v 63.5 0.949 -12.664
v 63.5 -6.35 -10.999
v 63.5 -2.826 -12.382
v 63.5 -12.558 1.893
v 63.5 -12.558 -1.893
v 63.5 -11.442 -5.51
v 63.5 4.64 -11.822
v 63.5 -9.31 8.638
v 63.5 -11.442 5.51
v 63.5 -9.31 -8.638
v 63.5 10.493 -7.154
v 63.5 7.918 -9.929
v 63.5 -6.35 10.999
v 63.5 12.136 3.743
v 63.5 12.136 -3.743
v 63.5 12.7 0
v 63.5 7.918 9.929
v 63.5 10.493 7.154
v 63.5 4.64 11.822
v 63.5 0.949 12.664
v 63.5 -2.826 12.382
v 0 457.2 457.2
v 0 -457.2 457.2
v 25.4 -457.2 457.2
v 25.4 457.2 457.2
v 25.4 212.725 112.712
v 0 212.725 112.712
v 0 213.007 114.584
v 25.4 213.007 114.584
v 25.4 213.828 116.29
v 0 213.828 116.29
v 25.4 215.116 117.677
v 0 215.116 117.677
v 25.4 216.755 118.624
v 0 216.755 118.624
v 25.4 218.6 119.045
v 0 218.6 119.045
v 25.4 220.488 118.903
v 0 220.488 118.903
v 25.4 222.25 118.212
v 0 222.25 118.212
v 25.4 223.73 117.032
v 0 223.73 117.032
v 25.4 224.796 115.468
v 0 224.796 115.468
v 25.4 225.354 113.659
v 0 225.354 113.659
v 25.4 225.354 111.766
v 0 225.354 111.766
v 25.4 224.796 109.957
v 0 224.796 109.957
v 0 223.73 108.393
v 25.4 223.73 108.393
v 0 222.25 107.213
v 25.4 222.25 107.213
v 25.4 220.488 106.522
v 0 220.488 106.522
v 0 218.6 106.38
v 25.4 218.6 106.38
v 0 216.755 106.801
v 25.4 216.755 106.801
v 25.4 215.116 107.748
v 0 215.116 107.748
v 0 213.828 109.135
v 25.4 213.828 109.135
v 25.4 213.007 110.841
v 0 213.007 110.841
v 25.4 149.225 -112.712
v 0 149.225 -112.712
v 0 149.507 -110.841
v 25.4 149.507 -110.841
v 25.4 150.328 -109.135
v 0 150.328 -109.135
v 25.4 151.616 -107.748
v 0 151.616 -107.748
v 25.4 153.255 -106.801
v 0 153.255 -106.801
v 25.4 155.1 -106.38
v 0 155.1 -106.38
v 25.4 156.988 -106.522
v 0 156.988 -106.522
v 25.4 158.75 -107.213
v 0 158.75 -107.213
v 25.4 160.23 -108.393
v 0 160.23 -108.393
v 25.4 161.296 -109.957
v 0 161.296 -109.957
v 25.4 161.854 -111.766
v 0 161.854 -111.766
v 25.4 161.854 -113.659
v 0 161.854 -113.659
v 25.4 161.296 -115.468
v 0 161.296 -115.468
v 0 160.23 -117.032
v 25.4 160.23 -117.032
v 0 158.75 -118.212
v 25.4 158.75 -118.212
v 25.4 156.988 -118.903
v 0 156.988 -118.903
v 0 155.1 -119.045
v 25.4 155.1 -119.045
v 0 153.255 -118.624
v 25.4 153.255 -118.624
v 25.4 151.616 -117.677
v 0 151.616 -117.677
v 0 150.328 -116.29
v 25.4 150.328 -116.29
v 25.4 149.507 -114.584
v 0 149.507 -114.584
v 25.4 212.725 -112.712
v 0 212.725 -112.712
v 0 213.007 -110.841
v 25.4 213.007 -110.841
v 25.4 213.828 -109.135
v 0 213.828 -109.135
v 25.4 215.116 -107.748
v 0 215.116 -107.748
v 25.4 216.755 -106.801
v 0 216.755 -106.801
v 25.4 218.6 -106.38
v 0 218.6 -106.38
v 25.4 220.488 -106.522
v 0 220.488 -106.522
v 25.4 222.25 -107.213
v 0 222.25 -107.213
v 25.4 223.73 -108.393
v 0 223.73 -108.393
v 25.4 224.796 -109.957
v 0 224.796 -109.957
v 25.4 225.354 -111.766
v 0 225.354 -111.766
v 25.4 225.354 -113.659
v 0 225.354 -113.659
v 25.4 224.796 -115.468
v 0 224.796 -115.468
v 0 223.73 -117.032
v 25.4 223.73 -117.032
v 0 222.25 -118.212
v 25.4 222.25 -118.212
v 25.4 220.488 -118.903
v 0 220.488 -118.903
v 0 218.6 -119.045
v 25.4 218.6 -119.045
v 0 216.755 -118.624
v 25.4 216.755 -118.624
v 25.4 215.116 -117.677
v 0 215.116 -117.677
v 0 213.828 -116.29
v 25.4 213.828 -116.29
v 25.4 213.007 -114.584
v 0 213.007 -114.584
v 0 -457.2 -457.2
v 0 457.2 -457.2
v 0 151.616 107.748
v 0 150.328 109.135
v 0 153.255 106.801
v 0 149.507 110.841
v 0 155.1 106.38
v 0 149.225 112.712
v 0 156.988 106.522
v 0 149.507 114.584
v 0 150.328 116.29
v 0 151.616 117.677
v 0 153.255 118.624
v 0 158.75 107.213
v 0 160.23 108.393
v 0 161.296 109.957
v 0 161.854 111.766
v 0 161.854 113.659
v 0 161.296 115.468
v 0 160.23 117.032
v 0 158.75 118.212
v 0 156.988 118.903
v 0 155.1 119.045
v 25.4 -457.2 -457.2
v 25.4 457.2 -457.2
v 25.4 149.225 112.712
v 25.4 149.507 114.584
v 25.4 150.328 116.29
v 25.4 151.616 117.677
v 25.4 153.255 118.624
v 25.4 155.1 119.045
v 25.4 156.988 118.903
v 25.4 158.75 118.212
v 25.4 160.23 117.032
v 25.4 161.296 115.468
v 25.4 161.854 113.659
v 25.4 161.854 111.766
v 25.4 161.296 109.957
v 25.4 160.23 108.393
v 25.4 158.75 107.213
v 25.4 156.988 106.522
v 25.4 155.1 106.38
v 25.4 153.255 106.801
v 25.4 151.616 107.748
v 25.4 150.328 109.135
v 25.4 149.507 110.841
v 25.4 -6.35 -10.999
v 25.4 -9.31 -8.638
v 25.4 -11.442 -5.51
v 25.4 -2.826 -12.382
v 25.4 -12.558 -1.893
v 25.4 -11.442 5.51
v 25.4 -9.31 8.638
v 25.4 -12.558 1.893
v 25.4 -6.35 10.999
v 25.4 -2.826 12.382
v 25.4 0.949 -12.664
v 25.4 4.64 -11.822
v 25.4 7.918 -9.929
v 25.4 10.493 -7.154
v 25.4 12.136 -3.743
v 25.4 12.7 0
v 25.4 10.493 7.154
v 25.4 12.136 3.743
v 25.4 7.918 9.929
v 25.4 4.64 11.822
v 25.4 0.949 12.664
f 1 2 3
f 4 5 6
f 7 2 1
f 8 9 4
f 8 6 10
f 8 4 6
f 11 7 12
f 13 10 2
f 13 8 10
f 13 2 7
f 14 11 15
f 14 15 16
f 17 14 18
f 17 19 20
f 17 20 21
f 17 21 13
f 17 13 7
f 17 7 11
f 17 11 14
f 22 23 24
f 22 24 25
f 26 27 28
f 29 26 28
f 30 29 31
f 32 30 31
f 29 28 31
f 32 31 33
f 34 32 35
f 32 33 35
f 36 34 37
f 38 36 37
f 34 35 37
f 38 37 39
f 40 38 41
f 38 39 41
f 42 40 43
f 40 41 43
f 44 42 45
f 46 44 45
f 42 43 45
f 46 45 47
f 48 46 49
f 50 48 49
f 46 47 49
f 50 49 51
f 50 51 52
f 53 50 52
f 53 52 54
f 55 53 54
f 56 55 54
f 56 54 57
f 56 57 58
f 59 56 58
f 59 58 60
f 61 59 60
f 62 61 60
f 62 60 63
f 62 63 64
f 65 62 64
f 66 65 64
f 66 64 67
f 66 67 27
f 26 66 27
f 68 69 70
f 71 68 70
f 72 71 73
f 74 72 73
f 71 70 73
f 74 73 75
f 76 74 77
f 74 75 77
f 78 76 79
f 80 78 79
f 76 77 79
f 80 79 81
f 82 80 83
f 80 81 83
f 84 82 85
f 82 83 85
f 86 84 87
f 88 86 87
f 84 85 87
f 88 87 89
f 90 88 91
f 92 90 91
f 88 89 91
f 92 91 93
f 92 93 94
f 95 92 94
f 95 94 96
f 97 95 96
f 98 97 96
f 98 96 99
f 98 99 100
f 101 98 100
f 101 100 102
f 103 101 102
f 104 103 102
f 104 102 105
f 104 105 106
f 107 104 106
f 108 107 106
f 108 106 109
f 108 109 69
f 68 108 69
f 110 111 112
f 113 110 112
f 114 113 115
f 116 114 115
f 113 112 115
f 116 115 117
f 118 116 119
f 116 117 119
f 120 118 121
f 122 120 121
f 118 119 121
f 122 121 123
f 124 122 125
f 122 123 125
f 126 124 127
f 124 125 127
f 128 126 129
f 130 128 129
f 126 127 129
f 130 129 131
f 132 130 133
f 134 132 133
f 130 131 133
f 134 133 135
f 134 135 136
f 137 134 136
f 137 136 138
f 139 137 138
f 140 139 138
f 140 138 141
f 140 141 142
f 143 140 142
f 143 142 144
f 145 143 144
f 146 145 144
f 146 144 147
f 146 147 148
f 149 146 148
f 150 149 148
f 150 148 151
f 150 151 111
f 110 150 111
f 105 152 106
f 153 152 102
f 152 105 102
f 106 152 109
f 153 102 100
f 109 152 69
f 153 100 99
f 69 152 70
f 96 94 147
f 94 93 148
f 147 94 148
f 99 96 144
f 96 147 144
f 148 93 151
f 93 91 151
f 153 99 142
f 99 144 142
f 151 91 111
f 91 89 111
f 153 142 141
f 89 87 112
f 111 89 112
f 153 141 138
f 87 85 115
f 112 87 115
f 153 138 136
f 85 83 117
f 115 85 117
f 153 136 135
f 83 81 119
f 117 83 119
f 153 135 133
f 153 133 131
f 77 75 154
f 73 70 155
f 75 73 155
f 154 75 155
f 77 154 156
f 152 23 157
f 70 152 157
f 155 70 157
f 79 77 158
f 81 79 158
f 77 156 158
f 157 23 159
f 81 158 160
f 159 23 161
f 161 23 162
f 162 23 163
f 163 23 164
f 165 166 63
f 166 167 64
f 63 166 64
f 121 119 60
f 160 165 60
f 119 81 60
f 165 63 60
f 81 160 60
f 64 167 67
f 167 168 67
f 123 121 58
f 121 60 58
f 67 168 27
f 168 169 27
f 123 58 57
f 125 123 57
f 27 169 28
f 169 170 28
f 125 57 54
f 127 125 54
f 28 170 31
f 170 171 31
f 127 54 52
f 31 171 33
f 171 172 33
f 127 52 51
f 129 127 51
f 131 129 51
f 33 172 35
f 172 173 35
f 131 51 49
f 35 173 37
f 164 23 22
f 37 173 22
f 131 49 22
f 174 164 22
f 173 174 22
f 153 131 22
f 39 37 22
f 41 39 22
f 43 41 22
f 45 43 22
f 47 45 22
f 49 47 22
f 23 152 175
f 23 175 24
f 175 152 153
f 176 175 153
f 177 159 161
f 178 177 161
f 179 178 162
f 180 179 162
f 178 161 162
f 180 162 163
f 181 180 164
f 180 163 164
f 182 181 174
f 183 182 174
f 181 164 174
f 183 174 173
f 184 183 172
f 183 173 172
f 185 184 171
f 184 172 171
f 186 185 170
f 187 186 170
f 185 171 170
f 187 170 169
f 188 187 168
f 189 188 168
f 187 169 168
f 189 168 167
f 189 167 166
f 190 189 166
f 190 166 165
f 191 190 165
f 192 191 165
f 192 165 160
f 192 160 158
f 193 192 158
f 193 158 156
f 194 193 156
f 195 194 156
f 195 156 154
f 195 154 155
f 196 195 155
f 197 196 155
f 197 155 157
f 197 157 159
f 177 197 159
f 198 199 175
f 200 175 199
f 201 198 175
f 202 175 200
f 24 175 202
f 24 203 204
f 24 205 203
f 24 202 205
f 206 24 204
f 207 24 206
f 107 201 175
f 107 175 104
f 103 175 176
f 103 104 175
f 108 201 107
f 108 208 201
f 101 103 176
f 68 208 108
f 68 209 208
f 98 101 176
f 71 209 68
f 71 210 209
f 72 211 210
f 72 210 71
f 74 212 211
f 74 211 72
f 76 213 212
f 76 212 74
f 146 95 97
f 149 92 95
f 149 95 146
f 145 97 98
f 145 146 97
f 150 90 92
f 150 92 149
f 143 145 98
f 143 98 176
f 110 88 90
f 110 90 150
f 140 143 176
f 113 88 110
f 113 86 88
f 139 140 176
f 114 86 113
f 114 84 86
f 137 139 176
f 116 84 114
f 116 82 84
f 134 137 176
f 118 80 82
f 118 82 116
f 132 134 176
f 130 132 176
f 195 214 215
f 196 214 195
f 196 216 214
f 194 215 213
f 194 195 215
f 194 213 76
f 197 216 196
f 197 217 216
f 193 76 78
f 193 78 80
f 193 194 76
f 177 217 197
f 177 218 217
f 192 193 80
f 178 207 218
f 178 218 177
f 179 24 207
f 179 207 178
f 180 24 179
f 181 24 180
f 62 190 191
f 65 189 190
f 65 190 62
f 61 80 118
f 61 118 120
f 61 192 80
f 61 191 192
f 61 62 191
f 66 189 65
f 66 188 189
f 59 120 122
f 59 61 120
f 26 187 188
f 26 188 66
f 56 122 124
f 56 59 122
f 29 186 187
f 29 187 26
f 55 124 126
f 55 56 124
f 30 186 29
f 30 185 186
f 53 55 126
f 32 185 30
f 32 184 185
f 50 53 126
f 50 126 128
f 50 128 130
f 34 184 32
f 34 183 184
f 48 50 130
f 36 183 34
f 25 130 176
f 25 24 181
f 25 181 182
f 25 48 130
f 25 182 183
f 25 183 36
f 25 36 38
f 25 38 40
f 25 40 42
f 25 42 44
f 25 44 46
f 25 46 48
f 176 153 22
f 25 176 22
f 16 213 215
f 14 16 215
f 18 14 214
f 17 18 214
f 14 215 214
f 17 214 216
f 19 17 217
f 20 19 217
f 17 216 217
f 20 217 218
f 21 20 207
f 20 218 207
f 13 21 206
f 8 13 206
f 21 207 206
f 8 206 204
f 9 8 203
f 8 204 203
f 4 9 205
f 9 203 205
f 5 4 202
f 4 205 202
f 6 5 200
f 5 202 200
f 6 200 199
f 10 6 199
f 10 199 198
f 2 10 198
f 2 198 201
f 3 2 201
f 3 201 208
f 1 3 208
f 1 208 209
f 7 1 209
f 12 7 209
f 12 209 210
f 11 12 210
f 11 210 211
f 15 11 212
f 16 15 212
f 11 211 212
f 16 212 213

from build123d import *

# Parameters (mm, degrees)
F0_W     = 914.4
F0_H     = 914.4
F1_DEPTH = 25.4
F2_R     = 12.7
F3_DEPTH = 38.1
F5_D     = 12.7


with BuildPart() as f1:
    # F0 (on Right) → F1 (new body)
    with BuildSketch(Plane.YZ):
        Rectangle(F0_W, F0_H)
    extrude(amount=F1_DEPTH)

    # F2 (on face) → F3 (join)
    with BuildSketch(Plane.YZ.offset(25.4)):
        Circle(F2_R)
    extrude(amount=F3_DEPTH)

    # F5 (through all)
    with Locations(Plane.YZ.offset(25.4)):
        with Locations((155.575, 112.7125), (219.075, 112.7125), (155.575, -112.7125), (219.075, -112.7125)):
            Hole(F5_D / 2)


solid = f1.part
